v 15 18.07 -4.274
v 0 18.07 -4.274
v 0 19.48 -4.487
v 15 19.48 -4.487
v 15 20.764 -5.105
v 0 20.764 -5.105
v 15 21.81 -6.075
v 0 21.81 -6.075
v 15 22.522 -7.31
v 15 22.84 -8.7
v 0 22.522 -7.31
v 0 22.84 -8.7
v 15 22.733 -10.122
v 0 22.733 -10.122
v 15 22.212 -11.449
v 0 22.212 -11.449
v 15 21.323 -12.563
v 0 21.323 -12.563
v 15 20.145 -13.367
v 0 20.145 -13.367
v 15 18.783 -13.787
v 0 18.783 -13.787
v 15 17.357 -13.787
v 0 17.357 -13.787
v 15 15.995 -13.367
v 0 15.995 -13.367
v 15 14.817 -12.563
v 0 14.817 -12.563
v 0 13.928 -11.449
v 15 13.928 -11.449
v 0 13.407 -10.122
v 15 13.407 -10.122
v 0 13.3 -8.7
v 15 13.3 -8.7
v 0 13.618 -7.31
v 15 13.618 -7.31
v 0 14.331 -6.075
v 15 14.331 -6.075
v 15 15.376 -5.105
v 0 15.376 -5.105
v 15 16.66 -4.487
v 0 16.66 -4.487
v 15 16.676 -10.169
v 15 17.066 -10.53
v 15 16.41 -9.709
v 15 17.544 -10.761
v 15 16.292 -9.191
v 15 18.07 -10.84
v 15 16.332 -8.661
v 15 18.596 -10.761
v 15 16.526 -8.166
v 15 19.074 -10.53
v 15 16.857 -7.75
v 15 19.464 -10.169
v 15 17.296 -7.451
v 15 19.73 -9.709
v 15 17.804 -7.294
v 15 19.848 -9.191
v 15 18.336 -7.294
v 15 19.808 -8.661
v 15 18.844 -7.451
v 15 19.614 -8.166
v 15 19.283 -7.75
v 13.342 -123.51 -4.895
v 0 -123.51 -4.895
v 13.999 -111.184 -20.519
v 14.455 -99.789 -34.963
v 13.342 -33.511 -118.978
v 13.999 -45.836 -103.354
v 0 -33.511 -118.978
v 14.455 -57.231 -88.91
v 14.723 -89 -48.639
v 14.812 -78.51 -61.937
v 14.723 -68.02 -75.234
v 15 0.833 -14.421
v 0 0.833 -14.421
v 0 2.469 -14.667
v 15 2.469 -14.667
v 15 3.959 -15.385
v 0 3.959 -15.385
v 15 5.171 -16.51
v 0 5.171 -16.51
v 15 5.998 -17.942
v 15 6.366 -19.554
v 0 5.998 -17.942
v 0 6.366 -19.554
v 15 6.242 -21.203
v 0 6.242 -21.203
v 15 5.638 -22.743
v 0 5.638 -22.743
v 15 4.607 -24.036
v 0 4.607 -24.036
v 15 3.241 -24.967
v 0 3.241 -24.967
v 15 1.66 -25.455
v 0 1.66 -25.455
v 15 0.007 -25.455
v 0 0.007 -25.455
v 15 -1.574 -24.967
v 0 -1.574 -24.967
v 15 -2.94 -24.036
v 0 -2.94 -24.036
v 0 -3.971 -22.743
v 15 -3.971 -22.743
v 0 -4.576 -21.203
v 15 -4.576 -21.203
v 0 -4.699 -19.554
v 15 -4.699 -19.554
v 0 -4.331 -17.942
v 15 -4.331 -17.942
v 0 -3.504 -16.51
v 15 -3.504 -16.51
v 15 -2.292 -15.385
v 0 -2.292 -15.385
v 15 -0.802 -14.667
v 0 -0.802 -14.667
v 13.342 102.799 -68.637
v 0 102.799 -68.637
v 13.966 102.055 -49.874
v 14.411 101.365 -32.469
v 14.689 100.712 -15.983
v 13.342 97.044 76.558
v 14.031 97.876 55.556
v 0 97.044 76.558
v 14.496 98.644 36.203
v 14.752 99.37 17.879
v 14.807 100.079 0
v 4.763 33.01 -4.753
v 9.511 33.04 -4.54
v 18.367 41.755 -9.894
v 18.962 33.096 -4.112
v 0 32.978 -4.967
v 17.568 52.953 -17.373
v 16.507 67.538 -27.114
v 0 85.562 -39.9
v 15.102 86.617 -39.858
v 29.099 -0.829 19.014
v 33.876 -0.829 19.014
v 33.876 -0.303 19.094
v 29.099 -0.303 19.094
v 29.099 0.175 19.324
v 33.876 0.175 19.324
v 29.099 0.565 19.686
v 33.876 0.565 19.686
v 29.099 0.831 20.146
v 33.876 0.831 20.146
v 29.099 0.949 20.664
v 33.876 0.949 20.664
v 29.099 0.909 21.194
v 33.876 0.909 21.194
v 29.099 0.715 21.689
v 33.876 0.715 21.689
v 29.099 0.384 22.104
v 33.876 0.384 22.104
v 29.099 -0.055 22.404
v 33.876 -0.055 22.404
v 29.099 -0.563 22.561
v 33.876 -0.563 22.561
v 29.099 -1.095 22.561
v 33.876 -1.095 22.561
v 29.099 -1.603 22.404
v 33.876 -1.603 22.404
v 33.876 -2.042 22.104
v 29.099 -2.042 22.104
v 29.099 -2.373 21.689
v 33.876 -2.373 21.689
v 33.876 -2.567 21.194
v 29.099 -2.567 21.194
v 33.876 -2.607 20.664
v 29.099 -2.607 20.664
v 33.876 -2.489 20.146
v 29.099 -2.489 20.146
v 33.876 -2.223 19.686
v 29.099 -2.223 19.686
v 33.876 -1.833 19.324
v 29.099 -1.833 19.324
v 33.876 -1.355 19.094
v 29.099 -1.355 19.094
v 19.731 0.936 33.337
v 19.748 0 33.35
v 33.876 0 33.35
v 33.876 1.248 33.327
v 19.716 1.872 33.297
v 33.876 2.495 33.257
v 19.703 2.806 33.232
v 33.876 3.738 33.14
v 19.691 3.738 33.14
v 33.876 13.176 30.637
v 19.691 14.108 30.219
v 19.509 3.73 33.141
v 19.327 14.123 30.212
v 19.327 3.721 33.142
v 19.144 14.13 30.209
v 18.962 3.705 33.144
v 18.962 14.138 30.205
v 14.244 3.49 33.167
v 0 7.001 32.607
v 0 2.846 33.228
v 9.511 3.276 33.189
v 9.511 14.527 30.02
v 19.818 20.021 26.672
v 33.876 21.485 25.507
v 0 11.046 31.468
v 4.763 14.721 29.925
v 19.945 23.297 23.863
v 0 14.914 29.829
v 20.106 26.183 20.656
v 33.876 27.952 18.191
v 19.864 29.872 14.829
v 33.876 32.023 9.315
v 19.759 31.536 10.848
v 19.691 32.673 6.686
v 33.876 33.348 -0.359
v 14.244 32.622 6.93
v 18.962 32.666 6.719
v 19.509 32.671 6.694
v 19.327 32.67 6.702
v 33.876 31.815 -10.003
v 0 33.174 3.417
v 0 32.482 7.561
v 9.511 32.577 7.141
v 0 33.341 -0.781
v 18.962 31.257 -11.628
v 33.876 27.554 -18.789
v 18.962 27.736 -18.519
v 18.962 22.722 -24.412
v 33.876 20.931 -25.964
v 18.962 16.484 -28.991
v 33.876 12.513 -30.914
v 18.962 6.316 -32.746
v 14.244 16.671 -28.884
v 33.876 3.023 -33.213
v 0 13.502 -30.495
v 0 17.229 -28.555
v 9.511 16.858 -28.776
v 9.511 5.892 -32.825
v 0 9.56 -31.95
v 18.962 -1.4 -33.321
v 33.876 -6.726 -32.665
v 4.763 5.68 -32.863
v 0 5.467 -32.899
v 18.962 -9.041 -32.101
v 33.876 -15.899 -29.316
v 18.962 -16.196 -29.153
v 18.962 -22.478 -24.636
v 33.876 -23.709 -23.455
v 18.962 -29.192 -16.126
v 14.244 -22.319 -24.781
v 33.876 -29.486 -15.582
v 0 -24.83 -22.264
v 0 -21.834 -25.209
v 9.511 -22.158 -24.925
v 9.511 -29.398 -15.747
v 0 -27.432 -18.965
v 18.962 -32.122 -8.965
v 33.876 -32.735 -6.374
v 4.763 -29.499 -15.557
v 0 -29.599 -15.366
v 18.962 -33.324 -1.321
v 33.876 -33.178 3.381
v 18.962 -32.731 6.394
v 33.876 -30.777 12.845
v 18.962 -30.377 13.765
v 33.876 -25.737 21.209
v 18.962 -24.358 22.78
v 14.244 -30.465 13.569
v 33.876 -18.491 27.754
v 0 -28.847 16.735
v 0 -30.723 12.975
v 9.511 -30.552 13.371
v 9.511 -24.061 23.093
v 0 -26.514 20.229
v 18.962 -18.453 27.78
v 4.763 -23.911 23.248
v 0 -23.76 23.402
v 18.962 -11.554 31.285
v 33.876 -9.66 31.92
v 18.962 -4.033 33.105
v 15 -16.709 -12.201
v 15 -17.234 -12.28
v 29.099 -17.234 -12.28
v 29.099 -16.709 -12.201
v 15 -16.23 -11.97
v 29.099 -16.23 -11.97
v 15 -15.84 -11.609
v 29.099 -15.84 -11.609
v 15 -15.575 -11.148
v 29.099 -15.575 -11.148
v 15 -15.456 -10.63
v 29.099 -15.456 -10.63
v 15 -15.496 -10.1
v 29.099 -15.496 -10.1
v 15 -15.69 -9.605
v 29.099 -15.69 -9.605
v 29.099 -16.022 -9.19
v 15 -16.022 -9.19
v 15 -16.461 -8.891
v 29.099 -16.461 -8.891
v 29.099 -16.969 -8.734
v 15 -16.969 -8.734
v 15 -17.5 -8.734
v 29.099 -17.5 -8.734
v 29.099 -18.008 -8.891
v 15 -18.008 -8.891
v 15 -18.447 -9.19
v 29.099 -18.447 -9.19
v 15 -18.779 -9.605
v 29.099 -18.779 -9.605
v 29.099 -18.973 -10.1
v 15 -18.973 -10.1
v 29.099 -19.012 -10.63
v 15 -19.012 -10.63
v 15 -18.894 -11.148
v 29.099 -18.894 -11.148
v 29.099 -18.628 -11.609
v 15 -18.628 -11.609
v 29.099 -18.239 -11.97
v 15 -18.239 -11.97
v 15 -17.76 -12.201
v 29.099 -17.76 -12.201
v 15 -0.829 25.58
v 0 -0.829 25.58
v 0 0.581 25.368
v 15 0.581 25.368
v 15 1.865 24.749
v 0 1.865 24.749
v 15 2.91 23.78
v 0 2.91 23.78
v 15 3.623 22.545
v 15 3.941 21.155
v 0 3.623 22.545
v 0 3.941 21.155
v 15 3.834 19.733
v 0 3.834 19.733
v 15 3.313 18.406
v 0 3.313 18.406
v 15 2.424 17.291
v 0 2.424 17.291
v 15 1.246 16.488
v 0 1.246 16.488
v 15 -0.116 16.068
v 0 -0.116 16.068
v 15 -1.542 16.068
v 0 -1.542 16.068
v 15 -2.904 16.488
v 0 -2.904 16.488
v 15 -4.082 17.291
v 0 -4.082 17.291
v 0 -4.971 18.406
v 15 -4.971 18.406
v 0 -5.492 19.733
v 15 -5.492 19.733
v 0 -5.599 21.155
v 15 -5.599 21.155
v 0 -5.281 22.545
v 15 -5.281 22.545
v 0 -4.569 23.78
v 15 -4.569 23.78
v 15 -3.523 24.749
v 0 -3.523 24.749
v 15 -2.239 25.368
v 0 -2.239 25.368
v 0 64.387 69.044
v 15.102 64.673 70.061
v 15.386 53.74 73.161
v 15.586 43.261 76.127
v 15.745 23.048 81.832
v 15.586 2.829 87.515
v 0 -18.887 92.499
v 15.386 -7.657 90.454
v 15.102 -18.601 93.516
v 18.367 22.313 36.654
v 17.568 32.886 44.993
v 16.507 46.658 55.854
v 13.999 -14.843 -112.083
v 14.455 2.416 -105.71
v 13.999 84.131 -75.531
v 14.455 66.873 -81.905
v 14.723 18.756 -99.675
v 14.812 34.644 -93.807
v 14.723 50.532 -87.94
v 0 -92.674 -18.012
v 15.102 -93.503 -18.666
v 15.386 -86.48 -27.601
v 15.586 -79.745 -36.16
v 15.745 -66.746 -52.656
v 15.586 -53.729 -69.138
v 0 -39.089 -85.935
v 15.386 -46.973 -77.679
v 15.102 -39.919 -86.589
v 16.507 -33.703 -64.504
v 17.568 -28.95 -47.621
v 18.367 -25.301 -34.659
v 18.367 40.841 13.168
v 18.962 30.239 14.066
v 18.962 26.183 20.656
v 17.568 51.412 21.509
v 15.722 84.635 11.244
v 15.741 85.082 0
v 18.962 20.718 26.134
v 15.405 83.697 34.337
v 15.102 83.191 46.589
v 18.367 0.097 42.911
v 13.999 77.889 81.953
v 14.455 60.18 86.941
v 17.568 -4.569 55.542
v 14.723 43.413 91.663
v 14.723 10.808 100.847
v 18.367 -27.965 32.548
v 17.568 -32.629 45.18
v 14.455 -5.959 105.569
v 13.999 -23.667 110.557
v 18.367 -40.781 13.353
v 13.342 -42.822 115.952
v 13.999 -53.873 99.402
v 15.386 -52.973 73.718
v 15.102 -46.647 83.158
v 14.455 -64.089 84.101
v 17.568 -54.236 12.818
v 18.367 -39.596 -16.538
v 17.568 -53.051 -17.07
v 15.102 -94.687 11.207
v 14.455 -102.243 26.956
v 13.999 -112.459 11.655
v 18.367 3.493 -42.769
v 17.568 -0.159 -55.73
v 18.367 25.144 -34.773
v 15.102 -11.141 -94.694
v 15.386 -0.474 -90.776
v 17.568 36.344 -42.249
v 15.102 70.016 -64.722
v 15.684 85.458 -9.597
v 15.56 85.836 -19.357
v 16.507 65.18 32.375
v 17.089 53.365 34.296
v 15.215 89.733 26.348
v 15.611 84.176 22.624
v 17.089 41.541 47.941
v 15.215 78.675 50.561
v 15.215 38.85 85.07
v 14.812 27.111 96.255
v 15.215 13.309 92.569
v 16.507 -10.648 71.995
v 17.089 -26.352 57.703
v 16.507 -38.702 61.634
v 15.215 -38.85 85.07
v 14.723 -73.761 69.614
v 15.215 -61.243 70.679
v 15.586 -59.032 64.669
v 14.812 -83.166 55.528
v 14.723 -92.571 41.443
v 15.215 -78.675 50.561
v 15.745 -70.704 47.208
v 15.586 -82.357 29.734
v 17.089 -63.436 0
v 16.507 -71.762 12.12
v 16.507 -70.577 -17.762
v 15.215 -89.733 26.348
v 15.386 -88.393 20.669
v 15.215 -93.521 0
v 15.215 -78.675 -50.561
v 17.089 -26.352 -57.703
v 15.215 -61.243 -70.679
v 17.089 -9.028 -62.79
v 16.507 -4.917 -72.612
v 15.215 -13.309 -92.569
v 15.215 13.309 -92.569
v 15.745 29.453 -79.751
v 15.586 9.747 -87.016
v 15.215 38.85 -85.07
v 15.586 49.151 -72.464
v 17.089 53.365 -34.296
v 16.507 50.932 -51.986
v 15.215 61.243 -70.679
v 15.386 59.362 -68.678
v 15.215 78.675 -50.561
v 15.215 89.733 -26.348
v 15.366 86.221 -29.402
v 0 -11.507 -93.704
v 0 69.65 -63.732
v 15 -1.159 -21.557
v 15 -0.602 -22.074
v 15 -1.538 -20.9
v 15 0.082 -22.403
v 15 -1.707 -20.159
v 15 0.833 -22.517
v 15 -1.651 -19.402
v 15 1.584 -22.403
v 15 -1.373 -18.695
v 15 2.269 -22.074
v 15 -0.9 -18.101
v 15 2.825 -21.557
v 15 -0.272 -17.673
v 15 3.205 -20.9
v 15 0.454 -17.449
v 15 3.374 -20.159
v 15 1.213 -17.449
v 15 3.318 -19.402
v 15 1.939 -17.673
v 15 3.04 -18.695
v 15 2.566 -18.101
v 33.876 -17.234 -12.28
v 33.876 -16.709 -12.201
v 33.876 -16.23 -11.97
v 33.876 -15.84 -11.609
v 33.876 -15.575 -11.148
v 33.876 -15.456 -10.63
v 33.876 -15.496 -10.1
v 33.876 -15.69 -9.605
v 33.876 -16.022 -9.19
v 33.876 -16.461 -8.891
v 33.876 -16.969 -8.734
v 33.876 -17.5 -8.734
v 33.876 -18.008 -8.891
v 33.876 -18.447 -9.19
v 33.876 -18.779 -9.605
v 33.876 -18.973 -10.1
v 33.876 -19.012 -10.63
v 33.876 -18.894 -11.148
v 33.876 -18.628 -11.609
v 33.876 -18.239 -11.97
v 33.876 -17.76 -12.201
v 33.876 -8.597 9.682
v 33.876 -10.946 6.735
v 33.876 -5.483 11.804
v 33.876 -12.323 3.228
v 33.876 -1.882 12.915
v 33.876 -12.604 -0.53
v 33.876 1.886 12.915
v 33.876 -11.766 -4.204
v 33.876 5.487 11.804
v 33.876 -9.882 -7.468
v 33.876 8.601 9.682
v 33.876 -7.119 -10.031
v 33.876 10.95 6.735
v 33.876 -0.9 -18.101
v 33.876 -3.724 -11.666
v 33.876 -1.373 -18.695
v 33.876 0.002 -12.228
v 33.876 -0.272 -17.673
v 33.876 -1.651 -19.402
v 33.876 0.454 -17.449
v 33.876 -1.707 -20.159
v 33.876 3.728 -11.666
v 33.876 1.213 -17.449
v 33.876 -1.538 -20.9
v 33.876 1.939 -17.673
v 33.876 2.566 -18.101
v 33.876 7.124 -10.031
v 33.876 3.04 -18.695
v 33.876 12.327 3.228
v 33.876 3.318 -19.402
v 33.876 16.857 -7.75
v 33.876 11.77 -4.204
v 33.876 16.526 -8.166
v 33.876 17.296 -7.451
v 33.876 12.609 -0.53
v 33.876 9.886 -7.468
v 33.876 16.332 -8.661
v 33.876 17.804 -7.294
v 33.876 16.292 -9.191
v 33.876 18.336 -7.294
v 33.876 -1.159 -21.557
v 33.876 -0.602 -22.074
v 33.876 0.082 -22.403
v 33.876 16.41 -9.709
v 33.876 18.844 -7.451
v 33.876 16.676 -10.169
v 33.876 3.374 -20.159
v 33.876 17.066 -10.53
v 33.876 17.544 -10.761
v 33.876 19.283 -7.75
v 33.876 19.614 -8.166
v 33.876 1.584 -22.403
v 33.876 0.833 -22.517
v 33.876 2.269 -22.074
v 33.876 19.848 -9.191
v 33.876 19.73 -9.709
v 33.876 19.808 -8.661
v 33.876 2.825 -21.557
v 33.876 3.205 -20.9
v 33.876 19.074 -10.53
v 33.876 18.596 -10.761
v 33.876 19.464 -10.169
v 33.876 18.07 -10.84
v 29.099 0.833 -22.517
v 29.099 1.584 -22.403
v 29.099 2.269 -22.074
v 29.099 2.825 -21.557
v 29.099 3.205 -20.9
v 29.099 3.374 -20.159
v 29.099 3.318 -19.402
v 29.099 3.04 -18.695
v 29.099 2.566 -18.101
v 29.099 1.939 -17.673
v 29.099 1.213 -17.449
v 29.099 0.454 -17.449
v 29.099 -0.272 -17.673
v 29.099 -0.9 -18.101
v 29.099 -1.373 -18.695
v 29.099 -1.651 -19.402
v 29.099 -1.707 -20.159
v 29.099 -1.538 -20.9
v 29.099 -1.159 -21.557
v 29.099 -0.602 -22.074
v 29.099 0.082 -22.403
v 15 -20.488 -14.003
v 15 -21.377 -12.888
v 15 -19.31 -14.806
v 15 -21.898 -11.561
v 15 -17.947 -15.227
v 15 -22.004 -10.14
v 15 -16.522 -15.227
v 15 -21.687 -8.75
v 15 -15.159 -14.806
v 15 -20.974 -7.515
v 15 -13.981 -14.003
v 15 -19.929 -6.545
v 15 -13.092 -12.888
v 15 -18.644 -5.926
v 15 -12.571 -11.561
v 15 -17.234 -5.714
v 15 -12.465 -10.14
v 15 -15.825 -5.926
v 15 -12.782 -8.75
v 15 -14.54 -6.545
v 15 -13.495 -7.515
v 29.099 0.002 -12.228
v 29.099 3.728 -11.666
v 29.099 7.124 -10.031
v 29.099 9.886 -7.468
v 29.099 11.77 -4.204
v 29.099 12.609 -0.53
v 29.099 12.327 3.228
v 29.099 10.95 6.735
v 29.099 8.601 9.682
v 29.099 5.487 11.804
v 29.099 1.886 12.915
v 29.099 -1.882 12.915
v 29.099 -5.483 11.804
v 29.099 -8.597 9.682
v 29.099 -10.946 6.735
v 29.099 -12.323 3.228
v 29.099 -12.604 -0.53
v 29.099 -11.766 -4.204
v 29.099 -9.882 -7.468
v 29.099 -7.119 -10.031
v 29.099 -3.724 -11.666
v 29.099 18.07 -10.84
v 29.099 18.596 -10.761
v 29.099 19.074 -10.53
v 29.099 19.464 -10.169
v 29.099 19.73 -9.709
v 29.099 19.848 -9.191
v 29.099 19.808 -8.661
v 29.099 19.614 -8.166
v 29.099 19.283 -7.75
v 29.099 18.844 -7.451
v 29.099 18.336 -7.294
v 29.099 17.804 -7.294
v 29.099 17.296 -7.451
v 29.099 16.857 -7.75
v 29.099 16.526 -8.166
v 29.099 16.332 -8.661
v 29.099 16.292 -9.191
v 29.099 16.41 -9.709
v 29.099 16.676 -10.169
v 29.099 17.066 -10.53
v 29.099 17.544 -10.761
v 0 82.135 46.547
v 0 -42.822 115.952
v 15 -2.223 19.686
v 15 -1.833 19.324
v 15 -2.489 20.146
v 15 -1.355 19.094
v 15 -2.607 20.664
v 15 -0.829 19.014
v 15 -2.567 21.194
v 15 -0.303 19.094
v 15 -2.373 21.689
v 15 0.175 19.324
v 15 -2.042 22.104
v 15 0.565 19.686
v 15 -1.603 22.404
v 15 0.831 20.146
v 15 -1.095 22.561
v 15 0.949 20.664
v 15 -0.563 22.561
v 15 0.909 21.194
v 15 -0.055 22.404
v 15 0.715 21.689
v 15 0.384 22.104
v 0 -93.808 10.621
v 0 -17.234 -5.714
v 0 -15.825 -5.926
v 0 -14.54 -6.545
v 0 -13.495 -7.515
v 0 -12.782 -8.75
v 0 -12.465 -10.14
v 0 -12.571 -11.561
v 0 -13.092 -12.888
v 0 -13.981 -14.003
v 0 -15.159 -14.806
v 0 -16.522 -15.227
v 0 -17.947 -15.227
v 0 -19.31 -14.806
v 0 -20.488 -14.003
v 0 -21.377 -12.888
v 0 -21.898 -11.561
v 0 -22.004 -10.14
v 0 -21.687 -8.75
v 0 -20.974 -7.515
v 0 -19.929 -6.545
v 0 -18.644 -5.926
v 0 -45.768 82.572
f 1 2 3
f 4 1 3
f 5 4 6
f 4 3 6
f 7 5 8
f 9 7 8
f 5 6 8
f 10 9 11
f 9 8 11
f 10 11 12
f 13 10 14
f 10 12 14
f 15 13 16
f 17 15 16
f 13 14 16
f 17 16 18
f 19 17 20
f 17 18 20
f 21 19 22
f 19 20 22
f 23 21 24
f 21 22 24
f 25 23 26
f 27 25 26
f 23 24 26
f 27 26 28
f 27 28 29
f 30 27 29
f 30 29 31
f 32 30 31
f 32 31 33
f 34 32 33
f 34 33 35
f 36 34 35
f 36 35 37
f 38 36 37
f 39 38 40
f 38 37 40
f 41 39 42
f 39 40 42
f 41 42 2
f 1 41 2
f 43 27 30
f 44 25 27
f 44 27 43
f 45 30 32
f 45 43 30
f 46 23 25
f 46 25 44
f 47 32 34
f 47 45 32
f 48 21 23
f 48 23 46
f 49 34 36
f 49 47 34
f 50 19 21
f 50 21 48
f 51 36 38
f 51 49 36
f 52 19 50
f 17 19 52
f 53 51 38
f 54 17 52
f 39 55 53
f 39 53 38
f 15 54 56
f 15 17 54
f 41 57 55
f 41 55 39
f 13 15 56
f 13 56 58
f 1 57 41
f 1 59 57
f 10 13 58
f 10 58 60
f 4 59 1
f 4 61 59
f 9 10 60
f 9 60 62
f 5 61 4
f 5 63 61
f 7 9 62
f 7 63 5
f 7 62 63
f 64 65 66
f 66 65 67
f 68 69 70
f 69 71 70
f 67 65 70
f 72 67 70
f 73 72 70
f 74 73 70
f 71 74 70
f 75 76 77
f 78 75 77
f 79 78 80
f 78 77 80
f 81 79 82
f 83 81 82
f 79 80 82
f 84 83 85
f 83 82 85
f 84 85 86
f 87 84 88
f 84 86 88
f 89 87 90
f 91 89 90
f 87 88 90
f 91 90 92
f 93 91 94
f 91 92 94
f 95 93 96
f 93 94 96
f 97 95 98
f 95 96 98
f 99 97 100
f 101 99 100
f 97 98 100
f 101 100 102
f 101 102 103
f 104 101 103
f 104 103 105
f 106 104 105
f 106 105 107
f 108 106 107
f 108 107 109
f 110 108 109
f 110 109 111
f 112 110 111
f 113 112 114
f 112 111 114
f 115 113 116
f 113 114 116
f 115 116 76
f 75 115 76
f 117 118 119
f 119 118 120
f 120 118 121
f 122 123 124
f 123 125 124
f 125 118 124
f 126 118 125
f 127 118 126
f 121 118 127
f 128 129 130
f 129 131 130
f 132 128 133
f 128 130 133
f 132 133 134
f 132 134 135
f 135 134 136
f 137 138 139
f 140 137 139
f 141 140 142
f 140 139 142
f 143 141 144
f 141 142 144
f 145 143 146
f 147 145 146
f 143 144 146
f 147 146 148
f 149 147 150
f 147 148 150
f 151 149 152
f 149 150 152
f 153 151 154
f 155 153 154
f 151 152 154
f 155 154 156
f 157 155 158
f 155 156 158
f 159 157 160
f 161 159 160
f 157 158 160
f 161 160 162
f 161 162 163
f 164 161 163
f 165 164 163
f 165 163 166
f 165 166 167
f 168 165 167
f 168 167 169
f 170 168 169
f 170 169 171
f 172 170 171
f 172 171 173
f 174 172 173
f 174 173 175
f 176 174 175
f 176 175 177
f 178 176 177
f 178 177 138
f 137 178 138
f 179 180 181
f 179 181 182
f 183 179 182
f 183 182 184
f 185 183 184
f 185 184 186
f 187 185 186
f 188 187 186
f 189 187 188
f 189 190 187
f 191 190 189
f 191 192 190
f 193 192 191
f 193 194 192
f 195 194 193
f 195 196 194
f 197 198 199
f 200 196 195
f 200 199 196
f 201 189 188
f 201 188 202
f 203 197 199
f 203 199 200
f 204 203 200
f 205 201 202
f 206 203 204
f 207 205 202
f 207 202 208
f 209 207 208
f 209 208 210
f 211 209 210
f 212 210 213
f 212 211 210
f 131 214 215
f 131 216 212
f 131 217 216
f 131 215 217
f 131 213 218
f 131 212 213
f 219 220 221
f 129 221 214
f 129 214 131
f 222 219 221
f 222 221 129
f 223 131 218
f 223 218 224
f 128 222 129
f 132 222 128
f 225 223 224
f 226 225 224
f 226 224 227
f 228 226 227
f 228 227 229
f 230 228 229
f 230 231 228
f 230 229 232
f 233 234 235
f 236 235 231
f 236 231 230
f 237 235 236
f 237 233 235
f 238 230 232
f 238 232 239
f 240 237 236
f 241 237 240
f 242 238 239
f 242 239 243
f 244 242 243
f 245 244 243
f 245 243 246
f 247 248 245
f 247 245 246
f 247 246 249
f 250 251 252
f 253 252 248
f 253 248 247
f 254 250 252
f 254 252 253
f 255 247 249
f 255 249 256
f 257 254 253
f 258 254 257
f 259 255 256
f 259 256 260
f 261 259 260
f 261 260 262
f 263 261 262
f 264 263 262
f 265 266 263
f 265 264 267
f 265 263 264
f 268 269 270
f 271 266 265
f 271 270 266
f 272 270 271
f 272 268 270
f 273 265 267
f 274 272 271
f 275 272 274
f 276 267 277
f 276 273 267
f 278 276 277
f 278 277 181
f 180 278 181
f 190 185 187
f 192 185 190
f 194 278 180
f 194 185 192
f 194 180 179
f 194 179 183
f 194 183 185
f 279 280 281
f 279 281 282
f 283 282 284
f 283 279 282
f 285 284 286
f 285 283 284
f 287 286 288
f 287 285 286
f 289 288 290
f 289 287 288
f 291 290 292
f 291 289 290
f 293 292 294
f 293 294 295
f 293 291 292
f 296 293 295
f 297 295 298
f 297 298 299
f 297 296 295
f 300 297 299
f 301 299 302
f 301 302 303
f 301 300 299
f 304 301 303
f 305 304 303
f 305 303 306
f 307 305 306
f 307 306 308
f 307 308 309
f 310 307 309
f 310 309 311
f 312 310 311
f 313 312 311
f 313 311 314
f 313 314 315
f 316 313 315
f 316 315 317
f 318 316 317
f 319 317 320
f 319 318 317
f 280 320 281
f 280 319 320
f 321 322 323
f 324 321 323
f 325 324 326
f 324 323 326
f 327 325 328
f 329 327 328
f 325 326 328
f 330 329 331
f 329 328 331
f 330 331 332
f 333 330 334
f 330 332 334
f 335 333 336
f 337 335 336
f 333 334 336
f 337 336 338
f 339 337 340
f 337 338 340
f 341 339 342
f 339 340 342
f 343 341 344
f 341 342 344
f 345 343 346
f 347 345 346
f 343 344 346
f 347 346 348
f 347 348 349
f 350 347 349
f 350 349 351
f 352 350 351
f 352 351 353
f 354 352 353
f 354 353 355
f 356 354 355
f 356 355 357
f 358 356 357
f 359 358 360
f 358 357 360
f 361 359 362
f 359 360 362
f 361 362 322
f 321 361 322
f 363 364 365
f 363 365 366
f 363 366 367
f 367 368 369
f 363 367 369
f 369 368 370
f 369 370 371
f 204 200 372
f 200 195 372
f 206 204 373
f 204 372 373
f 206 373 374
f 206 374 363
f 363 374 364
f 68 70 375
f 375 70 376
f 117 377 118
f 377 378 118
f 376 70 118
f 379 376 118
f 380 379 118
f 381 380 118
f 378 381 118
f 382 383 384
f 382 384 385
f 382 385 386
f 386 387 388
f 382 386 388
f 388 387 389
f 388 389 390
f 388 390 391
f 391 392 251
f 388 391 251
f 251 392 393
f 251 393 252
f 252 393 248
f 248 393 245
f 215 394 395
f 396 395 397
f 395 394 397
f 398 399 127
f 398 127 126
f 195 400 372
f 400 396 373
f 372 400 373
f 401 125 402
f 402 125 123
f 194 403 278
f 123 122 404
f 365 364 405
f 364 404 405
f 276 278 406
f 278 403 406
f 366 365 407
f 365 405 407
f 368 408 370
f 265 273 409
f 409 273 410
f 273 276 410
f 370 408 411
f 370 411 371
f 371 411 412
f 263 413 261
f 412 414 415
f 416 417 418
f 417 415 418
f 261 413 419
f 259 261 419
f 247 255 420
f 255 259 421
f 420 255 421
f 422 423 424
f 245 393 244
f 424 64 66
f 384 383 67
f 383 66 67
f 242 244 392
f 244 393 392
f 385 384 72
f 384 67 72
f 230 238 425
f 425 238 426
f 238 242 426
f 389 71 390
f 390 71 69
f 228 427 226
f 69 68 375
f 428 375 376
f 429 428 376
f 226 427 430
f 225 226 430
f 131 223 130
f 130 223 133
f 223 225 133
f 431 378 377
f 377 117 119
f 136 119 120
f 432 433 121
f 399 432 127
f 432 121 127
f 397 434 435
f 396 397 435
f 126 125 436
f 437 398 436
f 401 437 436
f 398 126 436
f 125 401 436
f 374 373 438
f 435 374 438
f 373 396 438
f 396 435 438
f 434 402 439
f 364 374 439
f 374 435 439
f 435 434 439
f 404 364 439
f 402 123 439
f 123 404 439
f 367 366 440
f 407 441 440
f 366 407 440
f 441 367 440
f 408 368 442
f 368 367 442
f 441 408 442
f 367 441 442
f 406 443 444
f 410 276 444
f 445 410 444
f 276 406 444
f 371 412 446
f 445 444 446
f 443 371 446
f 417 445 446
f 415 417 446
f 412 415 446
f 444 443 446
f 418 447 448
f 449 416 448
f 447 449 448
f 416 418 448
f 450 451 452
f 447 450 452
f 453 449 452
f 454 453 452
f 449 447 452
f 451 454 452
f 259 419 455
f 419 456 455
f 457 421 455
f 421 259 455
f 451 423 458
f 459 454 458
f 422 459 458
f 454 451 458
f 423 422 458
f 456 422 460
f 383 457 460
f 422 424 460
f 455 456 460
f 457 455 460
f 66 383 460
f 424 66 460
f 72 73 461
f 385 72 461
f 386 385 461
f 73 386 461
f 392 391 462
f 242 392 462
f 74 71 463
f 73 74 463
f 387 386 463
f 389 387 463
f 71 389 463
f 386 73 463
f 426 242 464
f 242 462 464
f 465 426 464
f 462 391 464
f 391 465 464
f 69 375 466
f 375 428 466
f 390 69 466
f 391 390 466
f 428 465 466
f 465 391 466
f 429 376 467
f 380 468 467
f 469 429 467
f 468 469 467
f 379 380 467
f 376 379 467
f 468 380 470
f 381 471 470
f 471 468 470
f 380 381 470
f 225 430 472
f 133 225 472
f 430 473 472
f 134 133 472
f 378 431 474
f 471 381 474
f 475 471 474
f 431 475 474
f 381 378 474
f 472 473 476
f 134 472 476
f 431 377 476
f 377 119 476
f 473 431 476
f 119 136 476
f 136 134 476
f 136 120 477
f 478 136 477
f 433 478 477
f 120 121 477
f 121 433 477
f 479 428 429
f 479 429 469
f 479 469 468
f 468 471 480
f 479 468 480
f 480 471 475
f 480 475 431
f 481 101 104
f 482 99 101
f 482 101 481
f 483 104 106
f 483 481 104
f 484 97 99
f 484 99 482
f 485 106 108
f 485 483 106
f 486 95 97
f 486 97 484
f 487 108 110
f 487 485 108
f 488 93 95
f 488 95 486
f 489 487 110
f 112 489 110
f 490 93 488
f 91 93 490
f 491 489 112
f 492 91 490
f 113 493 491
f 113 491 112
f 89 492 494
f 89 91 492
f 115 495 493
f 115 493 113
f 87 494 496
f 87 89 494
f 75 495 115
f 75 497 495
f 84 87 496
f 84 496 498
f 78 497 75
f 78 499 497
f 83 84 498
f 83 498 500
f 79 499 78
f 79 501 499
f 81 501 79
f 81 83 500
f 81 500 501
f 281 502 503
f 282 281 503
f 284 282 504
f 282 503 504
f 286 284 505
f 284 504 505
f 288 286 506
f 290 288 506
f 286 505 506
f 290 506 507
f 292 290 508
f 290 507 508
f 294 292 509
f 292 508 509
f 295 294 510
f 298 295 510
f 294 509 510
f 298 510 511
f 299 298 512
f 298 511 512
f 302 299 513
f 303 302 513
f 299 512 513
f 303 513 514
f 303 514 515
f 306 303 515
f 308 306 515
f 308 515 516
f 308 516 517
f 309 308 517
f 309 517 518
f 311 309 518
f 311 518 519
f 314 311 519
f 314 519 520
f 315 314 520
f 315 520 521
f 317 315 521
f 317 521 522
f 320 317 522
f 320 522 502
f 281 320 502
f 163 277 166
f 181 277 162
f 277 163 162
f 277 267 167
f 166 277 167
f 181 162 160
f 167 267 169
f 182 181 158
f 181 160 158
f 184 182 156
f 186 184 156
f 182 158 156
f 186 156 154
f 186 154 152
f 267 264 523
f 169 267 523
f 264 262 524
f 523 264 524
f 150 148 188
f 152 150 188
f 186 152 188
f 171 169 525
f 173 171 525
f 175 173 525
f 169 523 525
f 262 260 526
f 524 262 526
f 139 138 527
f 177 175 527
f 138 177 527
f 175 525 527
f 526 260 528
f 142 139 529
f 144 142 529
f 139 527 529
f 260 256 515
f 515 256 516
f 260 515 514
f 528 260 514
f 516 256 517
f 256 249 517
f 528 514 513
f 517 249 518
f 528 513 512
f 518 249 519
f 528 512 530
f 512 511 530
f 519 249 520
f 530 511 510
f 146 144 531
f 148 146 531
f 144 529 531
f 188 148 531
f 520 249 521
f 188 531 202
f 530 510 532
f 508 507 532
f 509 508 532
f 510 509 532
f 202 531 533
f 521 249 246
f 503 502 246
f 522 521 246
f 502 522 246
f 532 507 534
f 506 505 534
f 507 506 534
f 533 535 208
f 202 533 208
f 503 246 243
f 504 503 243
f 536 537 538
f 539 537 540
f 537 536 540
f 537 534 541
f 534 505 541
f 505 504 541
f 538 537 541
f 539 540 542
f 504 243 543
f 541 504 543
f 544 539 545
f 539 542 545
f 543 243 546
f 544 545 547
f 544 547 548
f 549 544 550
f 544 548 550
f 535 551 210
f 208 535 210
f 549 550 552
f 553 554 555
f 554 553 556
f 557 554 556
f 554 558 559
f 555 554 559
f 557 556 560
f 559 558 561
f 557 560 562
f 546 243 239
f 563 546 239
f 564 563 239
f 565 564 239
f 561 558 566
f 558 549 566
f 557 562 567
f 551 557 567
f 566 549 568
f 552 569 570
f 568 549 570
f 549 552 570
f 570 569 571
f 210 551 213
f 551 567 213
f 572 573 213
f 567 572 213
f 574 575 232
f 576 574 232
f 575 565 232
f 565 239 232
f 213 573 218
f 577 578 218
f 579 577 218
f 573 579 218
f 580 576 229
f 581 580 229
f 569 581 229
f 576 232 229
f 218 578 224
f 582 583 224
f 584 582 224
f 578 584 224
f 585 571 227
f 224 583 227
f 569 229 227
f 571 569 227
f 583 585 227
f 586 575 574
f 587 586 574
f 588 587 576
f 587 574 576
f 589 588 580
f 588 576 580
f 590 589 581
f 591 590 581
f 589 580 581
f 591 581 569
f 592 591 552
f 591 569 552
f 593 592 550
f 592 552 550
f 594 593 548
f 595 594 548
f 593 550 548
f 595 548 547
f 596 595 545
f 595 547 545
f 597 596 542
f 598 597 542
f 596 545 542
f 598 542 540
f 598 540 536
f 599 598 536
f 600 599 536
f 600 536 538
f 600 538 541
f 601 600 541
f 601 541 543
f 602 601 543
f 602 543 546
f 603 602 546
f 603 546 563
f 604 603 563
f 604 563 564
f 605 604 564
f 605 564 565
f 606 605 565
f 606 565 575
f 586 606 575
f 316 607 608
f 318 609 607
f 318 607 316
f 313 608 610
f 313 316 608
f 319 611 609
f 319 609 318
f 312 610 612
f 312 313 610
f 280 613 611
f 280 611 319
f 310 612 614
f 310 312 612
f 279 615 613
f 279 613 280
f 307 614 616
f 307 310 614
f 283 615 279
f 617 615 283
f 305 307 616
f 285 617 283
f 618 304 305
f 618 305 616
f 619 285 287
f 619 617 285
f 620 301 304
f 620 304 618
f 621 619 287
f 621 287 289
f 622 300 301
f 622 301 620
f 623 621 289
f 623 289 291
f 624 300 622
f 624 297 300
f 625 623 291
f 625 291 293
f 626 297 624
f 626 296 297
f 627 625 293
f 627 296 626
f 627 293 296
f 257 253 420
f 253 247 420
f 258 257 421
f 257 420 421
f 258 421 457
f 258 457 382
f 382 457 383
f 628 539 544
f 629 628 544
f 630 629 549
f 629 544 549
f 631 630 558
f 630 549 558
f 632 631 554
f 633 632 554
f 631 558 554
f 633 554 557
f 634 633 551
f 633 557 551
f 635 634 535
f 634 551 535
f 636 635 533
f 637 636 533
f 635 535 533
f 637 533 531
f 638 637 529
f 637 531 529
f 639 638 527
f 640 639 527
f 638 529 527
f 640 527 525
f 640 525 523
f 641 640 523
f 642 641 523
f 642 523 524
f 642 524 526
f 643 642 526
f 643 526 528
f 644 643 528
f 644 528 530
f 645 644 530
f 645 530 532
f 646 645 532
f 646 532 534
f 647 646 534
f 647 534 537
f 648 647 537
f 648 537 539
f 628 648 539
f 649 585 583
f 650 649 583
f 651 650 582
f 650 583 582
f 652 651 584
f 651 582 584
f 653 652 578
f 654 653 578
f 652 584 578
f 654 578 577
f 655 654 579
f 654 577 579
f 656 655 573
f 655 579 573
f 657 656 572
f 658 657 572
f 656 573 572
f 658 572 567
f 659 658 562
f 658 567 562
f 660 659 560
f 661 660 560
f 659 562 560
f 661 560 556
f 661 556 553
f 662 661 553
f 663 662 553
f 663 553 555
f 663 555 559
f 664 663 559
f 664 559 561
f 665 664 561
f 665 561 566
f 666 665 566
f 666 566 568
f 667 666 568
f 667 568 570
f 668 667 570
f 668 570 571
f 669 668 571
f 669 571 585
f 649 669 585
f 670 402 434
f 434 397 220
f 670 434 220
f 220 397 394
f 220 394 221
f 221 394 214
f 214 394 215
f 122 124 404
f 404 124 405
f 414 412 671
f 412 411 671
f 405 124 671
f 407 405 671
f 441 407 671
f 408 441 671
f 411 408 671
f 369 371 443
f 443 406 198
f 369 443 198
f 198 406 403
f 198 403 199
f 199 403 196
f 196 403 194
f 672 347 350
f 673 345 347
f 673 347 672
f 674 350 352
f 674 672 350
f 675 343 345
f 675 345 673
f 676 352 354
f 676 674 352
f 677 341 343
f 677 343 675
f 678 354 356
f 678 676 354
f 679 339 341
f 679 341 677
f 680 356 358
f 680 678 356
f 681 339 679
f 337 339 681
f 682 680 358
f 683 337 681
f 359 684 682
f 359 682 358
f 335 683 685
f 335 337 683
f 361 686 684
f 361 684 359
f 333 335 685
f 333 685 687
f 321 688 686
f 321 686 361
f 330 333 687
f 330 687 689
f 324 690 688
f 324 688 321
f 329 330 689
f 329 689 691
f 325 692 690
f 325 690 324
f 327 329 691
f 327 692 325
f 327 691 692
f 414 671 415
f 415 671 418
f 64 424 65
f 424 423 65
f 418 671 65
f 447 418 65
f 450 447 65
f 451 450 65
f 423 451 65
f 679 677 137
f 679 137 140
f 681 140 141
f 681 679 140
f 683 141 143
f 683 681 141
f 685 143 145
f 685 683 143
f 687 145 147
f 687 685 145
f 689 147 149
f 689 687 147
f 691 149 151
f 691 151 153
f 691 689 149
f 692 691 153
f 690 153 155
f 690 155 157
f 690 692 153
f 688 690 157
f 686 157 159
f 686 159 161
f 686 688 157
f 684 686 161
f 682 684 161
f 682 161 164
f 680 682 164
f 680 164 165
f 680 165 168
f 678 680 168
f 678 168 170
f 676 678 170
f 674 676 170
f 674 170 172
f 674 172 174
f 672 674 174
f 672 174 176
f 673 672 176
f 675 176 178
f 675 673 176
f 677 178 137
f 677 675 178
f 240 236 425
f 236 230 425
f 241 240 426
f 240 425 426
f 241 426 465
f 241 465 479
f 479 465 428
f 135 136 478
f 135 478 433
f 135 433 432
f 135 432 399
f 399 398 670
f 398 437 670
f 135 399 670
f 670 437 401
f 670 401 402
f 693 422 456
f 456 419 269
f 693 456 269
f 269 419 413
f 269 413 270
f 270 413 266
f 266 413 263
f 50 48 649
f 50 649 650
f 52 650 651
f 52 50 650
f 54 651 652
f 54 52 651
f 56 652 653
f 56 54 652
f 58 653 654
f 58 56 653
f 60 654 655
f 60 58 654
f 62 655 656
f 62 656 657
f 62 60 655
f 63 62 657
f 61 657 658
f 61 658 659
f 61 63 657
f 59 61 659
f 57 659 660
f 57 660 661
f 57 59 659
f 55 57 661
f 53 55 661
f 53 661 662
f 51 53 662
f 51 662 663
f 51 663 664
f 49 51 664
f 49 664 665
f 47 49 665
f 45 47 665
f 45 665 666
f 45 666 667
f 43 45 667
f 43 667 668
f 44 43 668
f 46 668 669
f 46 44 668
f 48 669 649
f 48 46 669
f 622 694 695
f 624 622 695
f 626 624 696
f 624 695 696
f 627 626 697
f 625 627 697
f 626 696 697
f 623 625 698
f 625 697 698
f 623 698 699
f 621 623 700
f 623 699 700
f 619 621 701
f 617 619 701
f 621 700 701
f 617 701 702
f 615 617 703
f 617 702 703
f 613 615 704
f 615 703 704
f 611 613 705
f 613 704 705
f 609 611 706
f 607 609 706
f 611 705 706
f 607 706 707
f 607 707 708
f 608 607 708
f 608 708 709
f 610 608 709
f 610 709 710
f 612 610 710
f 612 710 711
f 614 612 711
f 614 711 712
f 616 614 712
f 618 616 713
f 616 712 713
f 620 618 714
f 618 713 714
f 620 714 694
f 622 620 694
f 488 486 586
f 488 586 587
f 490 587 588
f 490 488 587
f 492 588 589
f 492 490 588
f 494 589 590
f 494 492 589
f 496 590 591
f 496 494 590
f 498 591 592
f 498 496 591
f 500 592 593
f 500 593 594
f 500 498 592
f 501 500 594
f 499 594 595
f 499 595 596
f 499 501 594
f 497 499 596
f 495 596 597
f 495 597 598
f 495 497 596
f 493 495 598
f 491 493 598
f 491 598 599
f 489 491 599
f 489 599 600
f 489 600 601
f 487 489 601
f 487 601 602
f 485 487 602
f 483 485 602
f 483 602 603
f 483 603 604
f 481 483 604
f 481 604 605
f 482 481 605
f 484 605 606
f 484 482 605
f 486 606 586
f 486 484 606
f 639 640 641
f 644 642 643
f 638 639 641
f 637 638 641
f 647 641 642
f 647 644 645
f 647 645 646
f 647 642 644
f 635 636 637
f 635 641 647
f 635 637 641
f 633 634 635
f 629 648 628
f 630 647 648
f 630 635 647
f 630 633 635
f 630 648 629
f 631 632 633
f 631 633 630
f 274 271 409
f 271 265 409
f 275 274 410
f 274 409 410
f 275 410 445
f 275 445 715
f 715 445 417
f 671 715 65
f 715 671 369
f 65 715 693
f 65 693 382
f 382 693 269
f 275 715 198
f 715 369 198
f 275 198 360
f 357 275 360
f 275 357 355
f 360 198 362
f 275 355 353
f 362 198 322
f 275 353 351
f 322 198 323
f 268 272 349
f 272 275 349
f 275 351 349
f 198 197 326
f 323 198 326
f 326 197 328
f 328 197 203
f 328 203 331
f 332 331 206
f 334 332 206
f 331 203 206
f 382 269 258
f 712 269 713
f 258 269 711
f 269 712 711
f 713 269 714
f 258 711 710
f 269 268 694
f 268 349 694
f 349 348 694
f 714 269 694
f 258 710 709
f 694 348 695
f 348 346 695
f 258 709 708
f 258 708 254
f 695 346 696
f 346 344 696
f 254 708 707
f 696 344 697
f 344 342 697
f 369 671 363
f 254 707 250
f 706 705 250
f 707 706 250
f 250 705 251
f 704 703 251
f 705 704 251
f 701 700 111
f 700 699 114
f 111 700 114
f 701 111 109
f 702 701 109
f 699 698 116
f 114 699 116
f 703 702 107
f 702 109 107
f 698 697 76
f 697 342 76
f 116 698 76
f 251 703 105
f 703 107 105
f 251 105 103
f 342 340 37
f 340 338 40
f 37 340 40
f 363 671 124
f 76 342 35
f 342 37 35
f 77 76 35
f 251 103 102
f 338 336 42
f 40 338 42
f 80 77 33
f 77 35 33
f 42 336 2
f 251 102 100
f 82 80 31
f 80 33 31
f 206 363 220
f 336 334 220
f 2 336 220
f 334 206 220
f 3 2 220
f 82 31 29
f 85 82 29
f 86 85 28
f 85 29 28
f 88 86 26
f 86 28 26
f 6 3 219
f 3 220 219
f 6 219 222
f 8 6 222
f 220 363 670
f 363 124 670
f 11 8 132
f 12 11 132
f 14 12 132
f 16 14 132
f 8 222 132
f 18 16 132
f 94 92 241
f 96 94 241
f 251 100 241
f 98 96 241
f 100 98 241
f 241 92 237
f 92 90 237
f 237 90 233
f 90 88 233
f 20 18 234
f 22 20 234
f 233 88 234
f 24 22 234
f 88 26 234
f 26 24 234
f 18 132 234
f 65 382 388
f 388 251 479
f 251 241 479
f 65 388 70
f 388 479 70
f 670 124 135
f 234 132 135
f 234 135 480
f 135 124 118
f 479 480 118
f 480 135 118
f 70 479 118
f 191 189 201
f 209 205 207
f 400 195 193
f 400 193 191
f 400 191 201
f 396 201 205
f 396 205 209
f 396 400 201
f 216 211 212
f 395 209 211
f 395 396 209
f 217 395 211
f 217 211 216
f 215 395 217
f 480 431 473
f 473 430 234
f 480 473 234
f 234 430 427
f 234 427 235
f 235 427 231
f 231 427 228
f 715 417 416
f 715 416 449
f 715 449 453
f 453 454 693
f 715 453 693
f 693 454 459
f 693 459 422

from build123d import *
from OCP.BRepAlgoAPI import BRepAlgoAPI_Cut
from OCP.TopTools import TopTools_ListOfShape
from build123d.topology import SkipClean

# Parameters (mm, degrees)
EXTRUDE_1_DEPTH             = 24
CUT_EXTRUDE_1_DEPTH         = 30
PATTERN_CIRCULAR_1_COUNT    = 5
CUT_EXTRUDE_2_DEPTH         = 84
PATTERN_CIRCULAR_2_COUNT    = 5
SKETCH_3_R                  = 33.35
EXTRUDE_2_DEPTH             = 60
CUT_EXTRUDE_START           = 0.102
CUT_EXTRUDE_4_OUTLINE_R     = 33.35
CUT_EXTRUDE_4_OUTLINE_R_2   = 9.18
CUT_EXTRUDE_4_DEPTH         = 5.799227236
CUT_EXTRUDE_START_2         = -12.5
CUT_EXTRUDE_4_2_OUTLINE_R   = 1.683
CUT_EXTRUDE_4_2_OUTLINE_R_2 = 2.448
CUT_EXTRUDE_4_2_DEPTH       = 12.738427236
CUT_EXTRUDE_START_3         = -1.428
CUT_EXTRUDE_4_3_OUTLINE_R   = 10.914
CUT_EXTRUDE_4_3_OUTLINE_R_2 = 9.18
CUT_EXTRUDE_4_3_DEPTH       = 1.666427236
CUT_EXTRUDE_4_4_OUTLINE_R   = 11.22
CUT_EXTRUDE_4_4_OUTLINE_R_2 = 10.914
CUT_EXTRUDE_4_4_DEPTH       = 1.122
CUT_EXTRUDE_4_5_OUTLINE_R   = 11.22
CUT_EXTRUDE_4_5_OUTLINE_R_2 = 10.914
CUT_EXTRUDE_4_5_DEPTH       = 0.238427236
SKETCH_11_R                 = 12.642
SKETCH_11_R_2               = 1.783
SKETCH_11_R_3               = 2.548
CUT_EXTRUDE_7_DEPTH         = 25
CUT_EXTRUDE_8_DEPTH         = 182.687484155
CUT_EXTRUDE_8_DEPTH_BACK    = 182.687484155
SKETCH_12_W                 = 55.167462985
SKETCH_12_H                 = 93.873666854
CUT_EXTRUDE_9_DEPTH         = 175.808256688
CUT_EXTRUDE_9_DEPTH_BACK    = 175.808256688
SKETCH_13_R                 = 1.783
SKETCH_13_R_2               = 2.548
SKETCH_14_R                 = 4.783
SKETCH_14_R_2               = 5.548
CUT_EXTRUDE_10_DEPTH        = 15


with BuildPart() as part:
    # 草图1 → 凸台-拉伸1 (new body)
    with BuildSketch(Plane(origin=(0, 0, 0), x_dir=(0, 0, -1), z_dir=(1, 0, 0))):
        Polygon((118.97758907, -33.510800483), (68.636762138, 102.799004534), (-76.557737191, 97.044079295), (-115.952045824, -42.822465123), (4.895431807, -123.509818223), align=None)
    extrude(amount=EXTRUDE_1_DEPTH)

    # 草图2 → 切除-拉伸1 (cut)
    with BuildSketch(Plane(origin=(21.885665564, 0.414902387, 1.473079874), x_dir=(0, 0.9625489150768215, -0.2711080708581613), z_dir=(-0.9975640502598243, -0.018911543026637837, -0.06714401812199275))):
        Polygon((-72.654252801, -98.71005792), (72.654252801, -98.71005792), (368.193435696, -98.71005792), (343.034484831, 55.492595796), (-381.628768987, 22.909231101), (-450.567959047, -98.71005792), align=None)
    cut_extrude_1 = extrude(amount=-CUT_EXTRUDE_1_DEPTH, mode=Mode.SUBTRACT)

    # 阵列(圆周)1: 切除-拉伸1 ×5 about axis
    pattern_circular_1_axis = Axis((0, 0, 0), (1, 0, 0))
    for i in range(1, PATTERN_CIRCULAR_1_COUNT):
        add(cut_extrude_1.rotate(pattern_circular_1_axis, i * 360 / PATTERN_CIRCULAR_1_COUNT), mode=Mode.SUBTRACT)

    # 草图4 → 切除-拉伸2 (cut)
    with BuildSketch(Plane(origin=(21.885665564, 0.530191543, -1.435620156), x_dir=(-0.06540654102068788, -0.0020321134284714422, -0.9978566304368194), z_dir=(0.9975640502598243, 0.024166503933362515, -0.06543657782046403))):
        Polygon((93.526415419, -11.461750602), (63.453576352, 69.657775992), (22.527950254, 8.351619529), align=None)
    cut_extrude_2 = extrude(amount=-CUT_EXTRUDE_2_DEPTH, mode=Mode.SUBTRACT)

    # 阵列(圆周)2: 切除-拉伸2 ×5 about axis
    pattern_circular_2_axis = Axis((0, 0, 0), (1, 0, 0))
    for i in range(1, PATTERN_CIRCULAR_2_COUNT):
        add(cut_extrude_2.rotate(pattern_circular_2_axis, i * 360 / PATTERN_CIRCULAR_2_COUNT), mode=Mode.SUBTRACT)

    # 草图3 → 凸台-拉伸2 (add)
    with BuildSketch(Plane.ZY):
        Circle(SKETCH_3_R)
    extrude(amount=-EXTRUDE_2_DEPTH)


with BuildPart() as cut_extrude_4_tool:
    # 切除-拉伸4: read off the stored shape, not the designer's step
    # 切除-拉伸4 outline → 切除-拉伸4 (new body)
    with BuildSketch(Plane(origin=(54.098772764, 0, 0), x_dir=(0, 0, -1), z_dir=(1, 0, 0)).offset(CUT_EXTRUDE_START)):
        Circle(CUT_EXTRUDE_4_OUTLINE_R)
        with Locations((-0.4144, 0.002184363)):
            Circle(CUT_EXTRUDE_4_OUTLINE_R_2, mode=Mode.SUBTRACT)
    extrude(amount=CUT_EXTRUDE_4_DEPTH)


with BuildPart() as part_1:
    add(part.part)

    # 切除-拉伸4: cut by cut_extrude_4_tool, with a tolerance
    cut_extrude_4_stock = TopTools_ListOfShape()
    cut_extrude_4_stock.Append(part_1.part.wrapped)
    cut_extrude_4_tools = TopTools_ListOfShape()
    cut_extrude_4_tools.Append(cut_extrude_4_tool.part.wrapped)
    cut_extrude_4_cut = BRepAlgoAPI_Cut()
    cut_extrude_4_cut.SetArguments(cut_extrude_4_stock)
    cut_extrude_4_cut.SetTools(cut_extrude_4_tools)
    cut_extrude_4_cut.SetFuzzyValue(0.00001)
    cut_extrude_4_cut.Build()
    add(Compound.cast(cut_extrude_4_cut.Shape()).solids(), mode=Mode.REPLACE)


with BuildPart() as cut_extrude_4_2_tool:
    # Cut-Extrude 4 2 outline → Cut-Extrude 4 2 (new body)
    with BuildSketch(Plane(origin=(54.098772764, 0, 0), x_dir=(0, 0, -1), z_dir=(1, 0, 0)).offset(CUT_EXTRUDE_START_2)):
        with Locations((-20.797458989, -0.829023312)):
            Circle(CUT_EXTRUDE_4_2_OUTLINE_R)
        with Locations((9.057282532, 18.070035094)):
            Circle(CUT_EXTRUDE_4_2_OUTLINE_R)
        with Locations((19.96865899, 0.83339204)):
            Circle(CUT_EXTRUDE_4_2_OUTLINE_R_2)
        with Locations((10.496976459, -17.234458691)):
            Circle(CUT_EXTRUDE_4_2_OUTLINE_R)
    extrude(amount=CUT_EXTRUDE_4_2_DEPTH)


with BuildPart() as part_2:
    add(part_1.part)

    # Cut-Extrude 4 2: cut by cut_extrude_4_2_tool, with a tolerance
    cut_extrude_4_2_stock = TopTools_ListOfShape()
    cut_extrude_4_2_stock.Append(part_2.part.wrapped)
    cut_extrude_4_2_tools = TopTools_ListOfShape()
    cut_extrude_4_2_tools.Append(cut_extrude_4_2_tool.part.wrapped)
    cut_extrude_4_2_cut = BRepAlgoAPI_Cut()
    cut_extrude_4_2_cut.SetArguments(cut_extrude_4_2_stock)
    cut_extrude_4_2_cut.SetTools(cut_extrude_4_2_tools)
    cut_extrude_4_2_cut.SetFuzzyValue(0.00001)
    cut_extrude_4_2_cut.Build()
    add(Compound.cast(cut_extrude_4_2_cut.Shape()).solids(), mode=Mode.REPLACE)


with BuildPart() as cut_extrude_4_3_tool:
    # Cut-Extrude 4 3 outline → Cut-Extrude 4 3 (new body)
    with BuildSketch(Plane(origin=(54.098772764, 0, 0), x_dir=(0, 0, -1), z_dir=(1, 0, 0)).offset(CUT_EXTRUDE_START_3)):
        with Locations((-0.4144, 0.002184363)):
            Circle(CUT_EXTRUDE_4_3_OUTLINE_R)
        with Locations((-0.4144, 0.002184363)):
            Circle(CUT_EXTRUDE_4_3_OUTLINE_R_2, mode=Mode.SUBTRACT)
    extrude(amount=CUT_EXTRUDE_4_3_DEPTH)


with BuildPart() as part_3:
    add(part_2.part)

    # Cut-Extrude 4 3: cut by cut_extrude_4_3_tool, with a tolerance
    cut_extrude_4_3_stock = TopTools_ListOfShape()
    cut_extrude_4_3_stock.Append(part_3.part.wrapped)
    cut_extrude_4_3_tools = TopTools_ListOfShape()
    cut_extrude_4_3_tools.Append(cut_extrude_4_3_tool.part.wrapped)
    cut_extrude_4_3_cut = BRepAlgoAPI_Cut()
    cut_extrude_4_3_cut.SetArguments(cut_extrude_4_3_stock)
    cut_extrude_4_3_cut.SetTools(cut_extrude_4_3_tools)
    cut_extrude_4_3_cut.SetFuzzyValue(0.00001)
    cut_extrude_4_3_cut.Build()
    add(Compound.cast(cut_extrude_4_3_cut.Shape()).solids(), mode=Mode.REPLACE)


with BuildPart() as cut_extrude_4_4_tool:
    # Cut-Extrude 4 4 outline → Cut-Extrude 4 4 (new body)
    with BuildSketch(Plane(origin=(54.098772764, 0, 0), x_dir=(0, 0, -1), z_dir=(1, 0, 0)).offset(CUT_EXTRUDE_START_3)):
        with Locations((-0.4144, 0.002184363)):
            Circle(CUT_EXTRUDE_4_4_OUTLINE_R)
        with Locations((-0.4144, 0.002184363)):
            Circle(CUT_EXTRUDE_4_4_OUTLINE_R_2, mode=Mode.SUBTRACT)
    extrude(amount=CUT_EXTRUDE_4_4_DEPTH)


with BuildPart() as part_4:
    add(part_3.part)

    # Cut-Extrude 4 4: cut by cut_extrude_4_4_tool, with a tolerance
    cut_extrude_4_4_stock = TopTools_ListOfShape()
    cut_extrude_4_4_stock.Append(part_4.part.wrapped)
    cut_extrude_4_4_tools = TopTools_ListOfShape()
    cut_extrude_4_4_tools.Append(cut_extrude_4_4_tool.part.wrapped)
    cut_extrude_4_4_cut = BRepAlgoAPI_Cut()
    cut_extrude_4_4_cut.SetArguments(cut_extrude_4_4_stock)
    cut_extrude_4_4_cut.SetTools(cut_extrude_4_4_tools)
    cut_extrude_4_4_cut.SetFuzzyValue(0.00001)
    cut_extrude_4_4_cut.Build()
    add(Compound.cast(cut_extrude_4_4_cut.Shape()).solids(), mode=Mode.REPLACE)


with BuildPart() as cut_extrude_4_5_tool:
    # Cut-Extrude 4 5 outline → Cut-Extrude 4 5 (new body)
    with BuildSketch(Plane(origin=(54.098772764, 0, 0), x_dir=(0, 0, -1), z_dir=(1, 0, 0))):
        with Locations((-0.4144, 0.002184363)):
            Circle(CUT_EXTRUDE_4_5_OUTLINE_R)
        with Locations((-0.4144, 0.002184363)):
            Circle(CUT_EXTRUDE_4_5_OUTLINE_R_2, mode=Mode.SUBTRACT)
    extrude(amount=CUT_EXTRUDE_4_5_DEPTH)


with BuildPart() as part_5:
    add(part_4.part)

    # Cut-Extrude 4 5: cut by cut_extrude_4_5_tool, with a tolerance
    cut_extrude_4_5_stock = TopTools_ListOfShape()
    cut_extrude_4_5_stock.Append(part_5.part.wrapped)
    cut_extrude_4_5_tools = TopTools_ListOfShape()
    cut_extrude_4_5_tools.Append(cut_extrude_4_5_tool.part.wrapped)
    cut_extrude_4_5_cut = BRepAlgoAPI_Cut()
    cut_extrude_4_5_cut.SetArguments(cut_extrude_4_5_stock)
    cut_extrude_4_5_cut.SetTools(cut_extrude_4_5_tools)
    cut_extrude_4_5_cut.SetFuzzyValue(0.00001)
    cut_extrude_4_5_cut.Build()
    add(Compound.cast(cut_extrude_4_5_cut.Shape()).solids(), mode=Mode.REPLACE)


with BuildPart() as cut_extrude_4_6_tool:
    # Cut-Extrude 4 6 outline → Cut-Extrude 4 6 (revolve)
    with BuildSketch(Plane(origin=(0, 0.002184363, 0.4144), x_dir=(0, 1, 0), z_dir=(0, 0, -1))):
        Polygon((33.764400071, 54.200772764), (12.24, 54.200772764), (12.342, 54.098772764), (33.764400071, 54.098772764), align=None)
        Polygon((12.138, 54.098772764), (12.24, 54.200772764), (11.22, 54.200772764), (11.22, 54.098772764), align=None)
        Polygon((11.118, 52.568772764), (11.22, 52.670772764), (9.18, 52.670772764), (9.282, 52.568772764), align=None)
    revolve(axis=Axis((0, 0.002184363, 0.4144), (1, 0, 0)))


with BuildPart() as part_6:
    add(part_5.part)

    # Cut-Extrude 4 6: cut by cut_extrude_4_6_tool, with a tolerance
    cut_extrude_4_6_stock = TopTools_ListOfShape()
    cut_extrude_4_6_stock.Append(part_6.part.wrapped)
    cut_extrude_4_6_tools = TopTools_ListOfShape()
    cut_extrude_4_6_tools.Append(cut_extrude_4_6_tool.part.wrapped)
    cut_extrude_4_6_cut = BRepAlgoAPI_Cut()
    cut_extrude_4_6_cut.SetArguments(cut_extrude_4_6_stock)
    cut_extrude_4_6_cut.SetTools(cut_extrude_4_6_tools)
    cut_extrude_4_6_cut.SetFuzzyValue(0.00001)
    cut_extrude_4_6_cut.Build()
    add(Compound.cast(cut_extrude_4_6_cut.Shape()).solids(), mode=Mode.REPLACE)


with BuildPart() as cut_extrude_4_7_tool:
    # Cut-Extrude 4 7 outline → Cut-Extrude 4 7 (revolve)
    with BuildSketch(Plane.YX):
        Polygon((123.60679775, 13.34204565), (123.60679775, 20.106005687), (33.349999999, 20.106005687), (33.349999999, 18.961940411), align=None)
    revolve(axis=Axis((0, 0, 0), (1, 0, 0)))


with BuildPart() as part_7:
    add(part_6.part)

    # Cut-Extrude 4 7: cut by cut_extrude_4_7_tool, with a tolerance
    cut_extrude_4_7_stock = TopTools_ListOfShape()
    cut_extrude_4_7_stock.Append(part_7.part.wrapped)
    cut_extrude_4_7_tools = TopTools_ListOfShape()
    cut_extrude_4_7_tools.Append(cut_extrude_4_7_tool.part.wrapped)
    cut_extrude_4_7_cut = BRepAlgoAPI_Cut()
    cut_extrude_4_7_cut.SetArguments(cut_extrude_4_7_stock)
    cut_extrude_4_7_cut.SetTools(cut_extrude_4_7_tools)
    cut_extrude_4_7_cut.SetFuzzyValue(0.00001)
    cut_extrude_4_7_cut.Build()
    add(Compound.cast(cut_extrude_4_7_cut.Shape()).solids(), mode=Mode.REPLACE)

    # 草图11 → 切除-拉伸7 (cut)
    with SkipClean():  # the faces are left unmerged after this step: merging them gives an invalid solid
        with BuildSketch(Plane(origin=(54.098772764, 0, 0), x_dir=(0, 0, -1), z_dir=(1, 0, 0))):
            with Locations((-0.4144, 0.002184363)):
                Circle(SKETCH_11_R)
            with Locations((-20.797458989, -0.829023312)):
                Circle(SKETCH_11_R_2)
            with Locations((9.057282532, 18.070035094)):
                Circle(SKETCH_11_R_2)
            with Locations((19.96865899, 0.83339204)):
                Circle(SKETCH_11_R_3)
            with Locations((10.496976459, -17.234458691)):
                Circle(SKETCH_11_R_2)
        extrude(amount=-CUT_EXTRUDE_7_DEPTH, mode=Mode.SUBTRACT)


with BuildPart() as cut_extrude_7_piece_1:
    # of the separate pieces the step leaves, piece 1, a body of its own (cut_extrude_7_pieces)
    add(part_7.part.solids().sort_by_distance((0, -33.510800483, -118.97758907))[0])


with BuildPart() as cut_extrude_7_piece_2:
    # of the separate pieces the step leaves, piece 2, a body of its own (cut_extrude_7_pieces)
    add(part_7.part.solids().sort_by_distance((60, 0.002184363, -8.7656))[0])


with BuildPart() as cut_extrude_7_piece_3:
    # of the separate pieces the step leaves, piece 3, a body of its own (cut_extrude_7_pieces)
    add(part_7.part.solids().sort_by_distance((54.200772764, 12.242184363, 0.4144))[0])


with BuildPart() as cut_extrude_8_tool:
    # 草图12 → 切除-拉伸8 (new, two sides: drawn at the far end of the back side and taken through both)
    with SkipClean():  # the faces are left unmerged after this step: merging them gives an invalid solid
        with BuildSketch(Plane.XY.offset(-CUT_EXTRUDE_8_DEPTH_BACK)):
            with Locations((61.45975115, -1.791464419)):
                Rectangle(SKETCH_12_W, SKETCH_12_H)
        extrude(amount=CUT_EXTRUDE_8_DEPTH + CUT_EXTRUDE_8_DEPTH_BACK)


with BuildPart() as cut_extrude_7_piece_1_1:
    with SkipClean():  # the faces are left unmerged after this step: merging them gives an invalid solid
        add(cut_extrude_7_piece_1.part)

        # 切除-拉伸8: cut by cut_extrude_8_tool
        add(cut_extrude_8_tool.part, mode=Mode.SUBTRACT)

    # 草图13 → 切除-拉伸9 (cut, two sides: drawn at the far end of the back side and taken through both)
    with SkipClean():  # the faces are left unmerged after this step: merging them gives an invalid solid
        with BuildSketch(Plane(origin=(33.876019657, 0, 0), x_dir=(0, 0, -1), z_dir=(1, 0, 0)).offset(-CUT_EXTRUDE_9_DEPTH_BACK)):
            with Locations((10.496976459, -17.234458691)):
                Circle(SKETCH_13_R)
            with Locations((19.96865899, 0.83339204)):
                Circle(SKETCH_13_R_2)
            with Locations((9.057282532, 18.070035094)):
                Circle(SKETCH_13_R)
            with Locations((-20.797458989, -0.829023312)):
                Circle(SKETCH_13_R)
        extrude(amount=CUT_EXTRUDE_9_DEPTH + CUT_EXTRUDE_9_DEPTH_BACK, mode=Mode.SUBTRACT)

    # 草图14 → 切除-拉伸10 (cut)
    with SkipClean():  # the faces are left unmerged after this step: merging them gives an invalid solid
        with BuildSketch(Plane.ZY):
            with Locations((-9.057282532, 18.070035094)):
                Circle(SKETCH_14_R)
            with Locations((-19.96865899, 0.83339204)):
                Circle(SKETCH_14_R_2)
            with Locations((-10.496976459, -17.234458691)):
                Circle(SKETCH_14_R)
            with Locations((20.797458989, -0.829023312)):
                Circle(SKETCH_14_R)
        extrude(amount=-CUT_EXTRUDE_10_DEPTH, mode=Mode.SUBTRACT)


with BuildPart() as cut_extrude_7_piece_2_1:
    with SkipClean():  # the faces are left unmerged after this step: merging them gives an invalid solid
        add(cut_extrude_7_piece_2.part)

        # 切除-拉伸8: cut by cut_extrude_8_tool
        add(cut_extrude_8_tool.part, mode=Mode.SUBTRACT)


with BuildPart() as cut_extrude_7_piece_3_1:
    with SkipClean():  # the faces are left unmerged after this step: merging them gives an invalid solid
        add(cut_extrude_7_piece_3.part)

        # 切除-拉伸8: cut by cut_extrude_8_tool
        add(cut_extrude_8_tool.part, mode=Mode.SUBTRACT)


solid = cut_extrude_7_piece_1_1.part
